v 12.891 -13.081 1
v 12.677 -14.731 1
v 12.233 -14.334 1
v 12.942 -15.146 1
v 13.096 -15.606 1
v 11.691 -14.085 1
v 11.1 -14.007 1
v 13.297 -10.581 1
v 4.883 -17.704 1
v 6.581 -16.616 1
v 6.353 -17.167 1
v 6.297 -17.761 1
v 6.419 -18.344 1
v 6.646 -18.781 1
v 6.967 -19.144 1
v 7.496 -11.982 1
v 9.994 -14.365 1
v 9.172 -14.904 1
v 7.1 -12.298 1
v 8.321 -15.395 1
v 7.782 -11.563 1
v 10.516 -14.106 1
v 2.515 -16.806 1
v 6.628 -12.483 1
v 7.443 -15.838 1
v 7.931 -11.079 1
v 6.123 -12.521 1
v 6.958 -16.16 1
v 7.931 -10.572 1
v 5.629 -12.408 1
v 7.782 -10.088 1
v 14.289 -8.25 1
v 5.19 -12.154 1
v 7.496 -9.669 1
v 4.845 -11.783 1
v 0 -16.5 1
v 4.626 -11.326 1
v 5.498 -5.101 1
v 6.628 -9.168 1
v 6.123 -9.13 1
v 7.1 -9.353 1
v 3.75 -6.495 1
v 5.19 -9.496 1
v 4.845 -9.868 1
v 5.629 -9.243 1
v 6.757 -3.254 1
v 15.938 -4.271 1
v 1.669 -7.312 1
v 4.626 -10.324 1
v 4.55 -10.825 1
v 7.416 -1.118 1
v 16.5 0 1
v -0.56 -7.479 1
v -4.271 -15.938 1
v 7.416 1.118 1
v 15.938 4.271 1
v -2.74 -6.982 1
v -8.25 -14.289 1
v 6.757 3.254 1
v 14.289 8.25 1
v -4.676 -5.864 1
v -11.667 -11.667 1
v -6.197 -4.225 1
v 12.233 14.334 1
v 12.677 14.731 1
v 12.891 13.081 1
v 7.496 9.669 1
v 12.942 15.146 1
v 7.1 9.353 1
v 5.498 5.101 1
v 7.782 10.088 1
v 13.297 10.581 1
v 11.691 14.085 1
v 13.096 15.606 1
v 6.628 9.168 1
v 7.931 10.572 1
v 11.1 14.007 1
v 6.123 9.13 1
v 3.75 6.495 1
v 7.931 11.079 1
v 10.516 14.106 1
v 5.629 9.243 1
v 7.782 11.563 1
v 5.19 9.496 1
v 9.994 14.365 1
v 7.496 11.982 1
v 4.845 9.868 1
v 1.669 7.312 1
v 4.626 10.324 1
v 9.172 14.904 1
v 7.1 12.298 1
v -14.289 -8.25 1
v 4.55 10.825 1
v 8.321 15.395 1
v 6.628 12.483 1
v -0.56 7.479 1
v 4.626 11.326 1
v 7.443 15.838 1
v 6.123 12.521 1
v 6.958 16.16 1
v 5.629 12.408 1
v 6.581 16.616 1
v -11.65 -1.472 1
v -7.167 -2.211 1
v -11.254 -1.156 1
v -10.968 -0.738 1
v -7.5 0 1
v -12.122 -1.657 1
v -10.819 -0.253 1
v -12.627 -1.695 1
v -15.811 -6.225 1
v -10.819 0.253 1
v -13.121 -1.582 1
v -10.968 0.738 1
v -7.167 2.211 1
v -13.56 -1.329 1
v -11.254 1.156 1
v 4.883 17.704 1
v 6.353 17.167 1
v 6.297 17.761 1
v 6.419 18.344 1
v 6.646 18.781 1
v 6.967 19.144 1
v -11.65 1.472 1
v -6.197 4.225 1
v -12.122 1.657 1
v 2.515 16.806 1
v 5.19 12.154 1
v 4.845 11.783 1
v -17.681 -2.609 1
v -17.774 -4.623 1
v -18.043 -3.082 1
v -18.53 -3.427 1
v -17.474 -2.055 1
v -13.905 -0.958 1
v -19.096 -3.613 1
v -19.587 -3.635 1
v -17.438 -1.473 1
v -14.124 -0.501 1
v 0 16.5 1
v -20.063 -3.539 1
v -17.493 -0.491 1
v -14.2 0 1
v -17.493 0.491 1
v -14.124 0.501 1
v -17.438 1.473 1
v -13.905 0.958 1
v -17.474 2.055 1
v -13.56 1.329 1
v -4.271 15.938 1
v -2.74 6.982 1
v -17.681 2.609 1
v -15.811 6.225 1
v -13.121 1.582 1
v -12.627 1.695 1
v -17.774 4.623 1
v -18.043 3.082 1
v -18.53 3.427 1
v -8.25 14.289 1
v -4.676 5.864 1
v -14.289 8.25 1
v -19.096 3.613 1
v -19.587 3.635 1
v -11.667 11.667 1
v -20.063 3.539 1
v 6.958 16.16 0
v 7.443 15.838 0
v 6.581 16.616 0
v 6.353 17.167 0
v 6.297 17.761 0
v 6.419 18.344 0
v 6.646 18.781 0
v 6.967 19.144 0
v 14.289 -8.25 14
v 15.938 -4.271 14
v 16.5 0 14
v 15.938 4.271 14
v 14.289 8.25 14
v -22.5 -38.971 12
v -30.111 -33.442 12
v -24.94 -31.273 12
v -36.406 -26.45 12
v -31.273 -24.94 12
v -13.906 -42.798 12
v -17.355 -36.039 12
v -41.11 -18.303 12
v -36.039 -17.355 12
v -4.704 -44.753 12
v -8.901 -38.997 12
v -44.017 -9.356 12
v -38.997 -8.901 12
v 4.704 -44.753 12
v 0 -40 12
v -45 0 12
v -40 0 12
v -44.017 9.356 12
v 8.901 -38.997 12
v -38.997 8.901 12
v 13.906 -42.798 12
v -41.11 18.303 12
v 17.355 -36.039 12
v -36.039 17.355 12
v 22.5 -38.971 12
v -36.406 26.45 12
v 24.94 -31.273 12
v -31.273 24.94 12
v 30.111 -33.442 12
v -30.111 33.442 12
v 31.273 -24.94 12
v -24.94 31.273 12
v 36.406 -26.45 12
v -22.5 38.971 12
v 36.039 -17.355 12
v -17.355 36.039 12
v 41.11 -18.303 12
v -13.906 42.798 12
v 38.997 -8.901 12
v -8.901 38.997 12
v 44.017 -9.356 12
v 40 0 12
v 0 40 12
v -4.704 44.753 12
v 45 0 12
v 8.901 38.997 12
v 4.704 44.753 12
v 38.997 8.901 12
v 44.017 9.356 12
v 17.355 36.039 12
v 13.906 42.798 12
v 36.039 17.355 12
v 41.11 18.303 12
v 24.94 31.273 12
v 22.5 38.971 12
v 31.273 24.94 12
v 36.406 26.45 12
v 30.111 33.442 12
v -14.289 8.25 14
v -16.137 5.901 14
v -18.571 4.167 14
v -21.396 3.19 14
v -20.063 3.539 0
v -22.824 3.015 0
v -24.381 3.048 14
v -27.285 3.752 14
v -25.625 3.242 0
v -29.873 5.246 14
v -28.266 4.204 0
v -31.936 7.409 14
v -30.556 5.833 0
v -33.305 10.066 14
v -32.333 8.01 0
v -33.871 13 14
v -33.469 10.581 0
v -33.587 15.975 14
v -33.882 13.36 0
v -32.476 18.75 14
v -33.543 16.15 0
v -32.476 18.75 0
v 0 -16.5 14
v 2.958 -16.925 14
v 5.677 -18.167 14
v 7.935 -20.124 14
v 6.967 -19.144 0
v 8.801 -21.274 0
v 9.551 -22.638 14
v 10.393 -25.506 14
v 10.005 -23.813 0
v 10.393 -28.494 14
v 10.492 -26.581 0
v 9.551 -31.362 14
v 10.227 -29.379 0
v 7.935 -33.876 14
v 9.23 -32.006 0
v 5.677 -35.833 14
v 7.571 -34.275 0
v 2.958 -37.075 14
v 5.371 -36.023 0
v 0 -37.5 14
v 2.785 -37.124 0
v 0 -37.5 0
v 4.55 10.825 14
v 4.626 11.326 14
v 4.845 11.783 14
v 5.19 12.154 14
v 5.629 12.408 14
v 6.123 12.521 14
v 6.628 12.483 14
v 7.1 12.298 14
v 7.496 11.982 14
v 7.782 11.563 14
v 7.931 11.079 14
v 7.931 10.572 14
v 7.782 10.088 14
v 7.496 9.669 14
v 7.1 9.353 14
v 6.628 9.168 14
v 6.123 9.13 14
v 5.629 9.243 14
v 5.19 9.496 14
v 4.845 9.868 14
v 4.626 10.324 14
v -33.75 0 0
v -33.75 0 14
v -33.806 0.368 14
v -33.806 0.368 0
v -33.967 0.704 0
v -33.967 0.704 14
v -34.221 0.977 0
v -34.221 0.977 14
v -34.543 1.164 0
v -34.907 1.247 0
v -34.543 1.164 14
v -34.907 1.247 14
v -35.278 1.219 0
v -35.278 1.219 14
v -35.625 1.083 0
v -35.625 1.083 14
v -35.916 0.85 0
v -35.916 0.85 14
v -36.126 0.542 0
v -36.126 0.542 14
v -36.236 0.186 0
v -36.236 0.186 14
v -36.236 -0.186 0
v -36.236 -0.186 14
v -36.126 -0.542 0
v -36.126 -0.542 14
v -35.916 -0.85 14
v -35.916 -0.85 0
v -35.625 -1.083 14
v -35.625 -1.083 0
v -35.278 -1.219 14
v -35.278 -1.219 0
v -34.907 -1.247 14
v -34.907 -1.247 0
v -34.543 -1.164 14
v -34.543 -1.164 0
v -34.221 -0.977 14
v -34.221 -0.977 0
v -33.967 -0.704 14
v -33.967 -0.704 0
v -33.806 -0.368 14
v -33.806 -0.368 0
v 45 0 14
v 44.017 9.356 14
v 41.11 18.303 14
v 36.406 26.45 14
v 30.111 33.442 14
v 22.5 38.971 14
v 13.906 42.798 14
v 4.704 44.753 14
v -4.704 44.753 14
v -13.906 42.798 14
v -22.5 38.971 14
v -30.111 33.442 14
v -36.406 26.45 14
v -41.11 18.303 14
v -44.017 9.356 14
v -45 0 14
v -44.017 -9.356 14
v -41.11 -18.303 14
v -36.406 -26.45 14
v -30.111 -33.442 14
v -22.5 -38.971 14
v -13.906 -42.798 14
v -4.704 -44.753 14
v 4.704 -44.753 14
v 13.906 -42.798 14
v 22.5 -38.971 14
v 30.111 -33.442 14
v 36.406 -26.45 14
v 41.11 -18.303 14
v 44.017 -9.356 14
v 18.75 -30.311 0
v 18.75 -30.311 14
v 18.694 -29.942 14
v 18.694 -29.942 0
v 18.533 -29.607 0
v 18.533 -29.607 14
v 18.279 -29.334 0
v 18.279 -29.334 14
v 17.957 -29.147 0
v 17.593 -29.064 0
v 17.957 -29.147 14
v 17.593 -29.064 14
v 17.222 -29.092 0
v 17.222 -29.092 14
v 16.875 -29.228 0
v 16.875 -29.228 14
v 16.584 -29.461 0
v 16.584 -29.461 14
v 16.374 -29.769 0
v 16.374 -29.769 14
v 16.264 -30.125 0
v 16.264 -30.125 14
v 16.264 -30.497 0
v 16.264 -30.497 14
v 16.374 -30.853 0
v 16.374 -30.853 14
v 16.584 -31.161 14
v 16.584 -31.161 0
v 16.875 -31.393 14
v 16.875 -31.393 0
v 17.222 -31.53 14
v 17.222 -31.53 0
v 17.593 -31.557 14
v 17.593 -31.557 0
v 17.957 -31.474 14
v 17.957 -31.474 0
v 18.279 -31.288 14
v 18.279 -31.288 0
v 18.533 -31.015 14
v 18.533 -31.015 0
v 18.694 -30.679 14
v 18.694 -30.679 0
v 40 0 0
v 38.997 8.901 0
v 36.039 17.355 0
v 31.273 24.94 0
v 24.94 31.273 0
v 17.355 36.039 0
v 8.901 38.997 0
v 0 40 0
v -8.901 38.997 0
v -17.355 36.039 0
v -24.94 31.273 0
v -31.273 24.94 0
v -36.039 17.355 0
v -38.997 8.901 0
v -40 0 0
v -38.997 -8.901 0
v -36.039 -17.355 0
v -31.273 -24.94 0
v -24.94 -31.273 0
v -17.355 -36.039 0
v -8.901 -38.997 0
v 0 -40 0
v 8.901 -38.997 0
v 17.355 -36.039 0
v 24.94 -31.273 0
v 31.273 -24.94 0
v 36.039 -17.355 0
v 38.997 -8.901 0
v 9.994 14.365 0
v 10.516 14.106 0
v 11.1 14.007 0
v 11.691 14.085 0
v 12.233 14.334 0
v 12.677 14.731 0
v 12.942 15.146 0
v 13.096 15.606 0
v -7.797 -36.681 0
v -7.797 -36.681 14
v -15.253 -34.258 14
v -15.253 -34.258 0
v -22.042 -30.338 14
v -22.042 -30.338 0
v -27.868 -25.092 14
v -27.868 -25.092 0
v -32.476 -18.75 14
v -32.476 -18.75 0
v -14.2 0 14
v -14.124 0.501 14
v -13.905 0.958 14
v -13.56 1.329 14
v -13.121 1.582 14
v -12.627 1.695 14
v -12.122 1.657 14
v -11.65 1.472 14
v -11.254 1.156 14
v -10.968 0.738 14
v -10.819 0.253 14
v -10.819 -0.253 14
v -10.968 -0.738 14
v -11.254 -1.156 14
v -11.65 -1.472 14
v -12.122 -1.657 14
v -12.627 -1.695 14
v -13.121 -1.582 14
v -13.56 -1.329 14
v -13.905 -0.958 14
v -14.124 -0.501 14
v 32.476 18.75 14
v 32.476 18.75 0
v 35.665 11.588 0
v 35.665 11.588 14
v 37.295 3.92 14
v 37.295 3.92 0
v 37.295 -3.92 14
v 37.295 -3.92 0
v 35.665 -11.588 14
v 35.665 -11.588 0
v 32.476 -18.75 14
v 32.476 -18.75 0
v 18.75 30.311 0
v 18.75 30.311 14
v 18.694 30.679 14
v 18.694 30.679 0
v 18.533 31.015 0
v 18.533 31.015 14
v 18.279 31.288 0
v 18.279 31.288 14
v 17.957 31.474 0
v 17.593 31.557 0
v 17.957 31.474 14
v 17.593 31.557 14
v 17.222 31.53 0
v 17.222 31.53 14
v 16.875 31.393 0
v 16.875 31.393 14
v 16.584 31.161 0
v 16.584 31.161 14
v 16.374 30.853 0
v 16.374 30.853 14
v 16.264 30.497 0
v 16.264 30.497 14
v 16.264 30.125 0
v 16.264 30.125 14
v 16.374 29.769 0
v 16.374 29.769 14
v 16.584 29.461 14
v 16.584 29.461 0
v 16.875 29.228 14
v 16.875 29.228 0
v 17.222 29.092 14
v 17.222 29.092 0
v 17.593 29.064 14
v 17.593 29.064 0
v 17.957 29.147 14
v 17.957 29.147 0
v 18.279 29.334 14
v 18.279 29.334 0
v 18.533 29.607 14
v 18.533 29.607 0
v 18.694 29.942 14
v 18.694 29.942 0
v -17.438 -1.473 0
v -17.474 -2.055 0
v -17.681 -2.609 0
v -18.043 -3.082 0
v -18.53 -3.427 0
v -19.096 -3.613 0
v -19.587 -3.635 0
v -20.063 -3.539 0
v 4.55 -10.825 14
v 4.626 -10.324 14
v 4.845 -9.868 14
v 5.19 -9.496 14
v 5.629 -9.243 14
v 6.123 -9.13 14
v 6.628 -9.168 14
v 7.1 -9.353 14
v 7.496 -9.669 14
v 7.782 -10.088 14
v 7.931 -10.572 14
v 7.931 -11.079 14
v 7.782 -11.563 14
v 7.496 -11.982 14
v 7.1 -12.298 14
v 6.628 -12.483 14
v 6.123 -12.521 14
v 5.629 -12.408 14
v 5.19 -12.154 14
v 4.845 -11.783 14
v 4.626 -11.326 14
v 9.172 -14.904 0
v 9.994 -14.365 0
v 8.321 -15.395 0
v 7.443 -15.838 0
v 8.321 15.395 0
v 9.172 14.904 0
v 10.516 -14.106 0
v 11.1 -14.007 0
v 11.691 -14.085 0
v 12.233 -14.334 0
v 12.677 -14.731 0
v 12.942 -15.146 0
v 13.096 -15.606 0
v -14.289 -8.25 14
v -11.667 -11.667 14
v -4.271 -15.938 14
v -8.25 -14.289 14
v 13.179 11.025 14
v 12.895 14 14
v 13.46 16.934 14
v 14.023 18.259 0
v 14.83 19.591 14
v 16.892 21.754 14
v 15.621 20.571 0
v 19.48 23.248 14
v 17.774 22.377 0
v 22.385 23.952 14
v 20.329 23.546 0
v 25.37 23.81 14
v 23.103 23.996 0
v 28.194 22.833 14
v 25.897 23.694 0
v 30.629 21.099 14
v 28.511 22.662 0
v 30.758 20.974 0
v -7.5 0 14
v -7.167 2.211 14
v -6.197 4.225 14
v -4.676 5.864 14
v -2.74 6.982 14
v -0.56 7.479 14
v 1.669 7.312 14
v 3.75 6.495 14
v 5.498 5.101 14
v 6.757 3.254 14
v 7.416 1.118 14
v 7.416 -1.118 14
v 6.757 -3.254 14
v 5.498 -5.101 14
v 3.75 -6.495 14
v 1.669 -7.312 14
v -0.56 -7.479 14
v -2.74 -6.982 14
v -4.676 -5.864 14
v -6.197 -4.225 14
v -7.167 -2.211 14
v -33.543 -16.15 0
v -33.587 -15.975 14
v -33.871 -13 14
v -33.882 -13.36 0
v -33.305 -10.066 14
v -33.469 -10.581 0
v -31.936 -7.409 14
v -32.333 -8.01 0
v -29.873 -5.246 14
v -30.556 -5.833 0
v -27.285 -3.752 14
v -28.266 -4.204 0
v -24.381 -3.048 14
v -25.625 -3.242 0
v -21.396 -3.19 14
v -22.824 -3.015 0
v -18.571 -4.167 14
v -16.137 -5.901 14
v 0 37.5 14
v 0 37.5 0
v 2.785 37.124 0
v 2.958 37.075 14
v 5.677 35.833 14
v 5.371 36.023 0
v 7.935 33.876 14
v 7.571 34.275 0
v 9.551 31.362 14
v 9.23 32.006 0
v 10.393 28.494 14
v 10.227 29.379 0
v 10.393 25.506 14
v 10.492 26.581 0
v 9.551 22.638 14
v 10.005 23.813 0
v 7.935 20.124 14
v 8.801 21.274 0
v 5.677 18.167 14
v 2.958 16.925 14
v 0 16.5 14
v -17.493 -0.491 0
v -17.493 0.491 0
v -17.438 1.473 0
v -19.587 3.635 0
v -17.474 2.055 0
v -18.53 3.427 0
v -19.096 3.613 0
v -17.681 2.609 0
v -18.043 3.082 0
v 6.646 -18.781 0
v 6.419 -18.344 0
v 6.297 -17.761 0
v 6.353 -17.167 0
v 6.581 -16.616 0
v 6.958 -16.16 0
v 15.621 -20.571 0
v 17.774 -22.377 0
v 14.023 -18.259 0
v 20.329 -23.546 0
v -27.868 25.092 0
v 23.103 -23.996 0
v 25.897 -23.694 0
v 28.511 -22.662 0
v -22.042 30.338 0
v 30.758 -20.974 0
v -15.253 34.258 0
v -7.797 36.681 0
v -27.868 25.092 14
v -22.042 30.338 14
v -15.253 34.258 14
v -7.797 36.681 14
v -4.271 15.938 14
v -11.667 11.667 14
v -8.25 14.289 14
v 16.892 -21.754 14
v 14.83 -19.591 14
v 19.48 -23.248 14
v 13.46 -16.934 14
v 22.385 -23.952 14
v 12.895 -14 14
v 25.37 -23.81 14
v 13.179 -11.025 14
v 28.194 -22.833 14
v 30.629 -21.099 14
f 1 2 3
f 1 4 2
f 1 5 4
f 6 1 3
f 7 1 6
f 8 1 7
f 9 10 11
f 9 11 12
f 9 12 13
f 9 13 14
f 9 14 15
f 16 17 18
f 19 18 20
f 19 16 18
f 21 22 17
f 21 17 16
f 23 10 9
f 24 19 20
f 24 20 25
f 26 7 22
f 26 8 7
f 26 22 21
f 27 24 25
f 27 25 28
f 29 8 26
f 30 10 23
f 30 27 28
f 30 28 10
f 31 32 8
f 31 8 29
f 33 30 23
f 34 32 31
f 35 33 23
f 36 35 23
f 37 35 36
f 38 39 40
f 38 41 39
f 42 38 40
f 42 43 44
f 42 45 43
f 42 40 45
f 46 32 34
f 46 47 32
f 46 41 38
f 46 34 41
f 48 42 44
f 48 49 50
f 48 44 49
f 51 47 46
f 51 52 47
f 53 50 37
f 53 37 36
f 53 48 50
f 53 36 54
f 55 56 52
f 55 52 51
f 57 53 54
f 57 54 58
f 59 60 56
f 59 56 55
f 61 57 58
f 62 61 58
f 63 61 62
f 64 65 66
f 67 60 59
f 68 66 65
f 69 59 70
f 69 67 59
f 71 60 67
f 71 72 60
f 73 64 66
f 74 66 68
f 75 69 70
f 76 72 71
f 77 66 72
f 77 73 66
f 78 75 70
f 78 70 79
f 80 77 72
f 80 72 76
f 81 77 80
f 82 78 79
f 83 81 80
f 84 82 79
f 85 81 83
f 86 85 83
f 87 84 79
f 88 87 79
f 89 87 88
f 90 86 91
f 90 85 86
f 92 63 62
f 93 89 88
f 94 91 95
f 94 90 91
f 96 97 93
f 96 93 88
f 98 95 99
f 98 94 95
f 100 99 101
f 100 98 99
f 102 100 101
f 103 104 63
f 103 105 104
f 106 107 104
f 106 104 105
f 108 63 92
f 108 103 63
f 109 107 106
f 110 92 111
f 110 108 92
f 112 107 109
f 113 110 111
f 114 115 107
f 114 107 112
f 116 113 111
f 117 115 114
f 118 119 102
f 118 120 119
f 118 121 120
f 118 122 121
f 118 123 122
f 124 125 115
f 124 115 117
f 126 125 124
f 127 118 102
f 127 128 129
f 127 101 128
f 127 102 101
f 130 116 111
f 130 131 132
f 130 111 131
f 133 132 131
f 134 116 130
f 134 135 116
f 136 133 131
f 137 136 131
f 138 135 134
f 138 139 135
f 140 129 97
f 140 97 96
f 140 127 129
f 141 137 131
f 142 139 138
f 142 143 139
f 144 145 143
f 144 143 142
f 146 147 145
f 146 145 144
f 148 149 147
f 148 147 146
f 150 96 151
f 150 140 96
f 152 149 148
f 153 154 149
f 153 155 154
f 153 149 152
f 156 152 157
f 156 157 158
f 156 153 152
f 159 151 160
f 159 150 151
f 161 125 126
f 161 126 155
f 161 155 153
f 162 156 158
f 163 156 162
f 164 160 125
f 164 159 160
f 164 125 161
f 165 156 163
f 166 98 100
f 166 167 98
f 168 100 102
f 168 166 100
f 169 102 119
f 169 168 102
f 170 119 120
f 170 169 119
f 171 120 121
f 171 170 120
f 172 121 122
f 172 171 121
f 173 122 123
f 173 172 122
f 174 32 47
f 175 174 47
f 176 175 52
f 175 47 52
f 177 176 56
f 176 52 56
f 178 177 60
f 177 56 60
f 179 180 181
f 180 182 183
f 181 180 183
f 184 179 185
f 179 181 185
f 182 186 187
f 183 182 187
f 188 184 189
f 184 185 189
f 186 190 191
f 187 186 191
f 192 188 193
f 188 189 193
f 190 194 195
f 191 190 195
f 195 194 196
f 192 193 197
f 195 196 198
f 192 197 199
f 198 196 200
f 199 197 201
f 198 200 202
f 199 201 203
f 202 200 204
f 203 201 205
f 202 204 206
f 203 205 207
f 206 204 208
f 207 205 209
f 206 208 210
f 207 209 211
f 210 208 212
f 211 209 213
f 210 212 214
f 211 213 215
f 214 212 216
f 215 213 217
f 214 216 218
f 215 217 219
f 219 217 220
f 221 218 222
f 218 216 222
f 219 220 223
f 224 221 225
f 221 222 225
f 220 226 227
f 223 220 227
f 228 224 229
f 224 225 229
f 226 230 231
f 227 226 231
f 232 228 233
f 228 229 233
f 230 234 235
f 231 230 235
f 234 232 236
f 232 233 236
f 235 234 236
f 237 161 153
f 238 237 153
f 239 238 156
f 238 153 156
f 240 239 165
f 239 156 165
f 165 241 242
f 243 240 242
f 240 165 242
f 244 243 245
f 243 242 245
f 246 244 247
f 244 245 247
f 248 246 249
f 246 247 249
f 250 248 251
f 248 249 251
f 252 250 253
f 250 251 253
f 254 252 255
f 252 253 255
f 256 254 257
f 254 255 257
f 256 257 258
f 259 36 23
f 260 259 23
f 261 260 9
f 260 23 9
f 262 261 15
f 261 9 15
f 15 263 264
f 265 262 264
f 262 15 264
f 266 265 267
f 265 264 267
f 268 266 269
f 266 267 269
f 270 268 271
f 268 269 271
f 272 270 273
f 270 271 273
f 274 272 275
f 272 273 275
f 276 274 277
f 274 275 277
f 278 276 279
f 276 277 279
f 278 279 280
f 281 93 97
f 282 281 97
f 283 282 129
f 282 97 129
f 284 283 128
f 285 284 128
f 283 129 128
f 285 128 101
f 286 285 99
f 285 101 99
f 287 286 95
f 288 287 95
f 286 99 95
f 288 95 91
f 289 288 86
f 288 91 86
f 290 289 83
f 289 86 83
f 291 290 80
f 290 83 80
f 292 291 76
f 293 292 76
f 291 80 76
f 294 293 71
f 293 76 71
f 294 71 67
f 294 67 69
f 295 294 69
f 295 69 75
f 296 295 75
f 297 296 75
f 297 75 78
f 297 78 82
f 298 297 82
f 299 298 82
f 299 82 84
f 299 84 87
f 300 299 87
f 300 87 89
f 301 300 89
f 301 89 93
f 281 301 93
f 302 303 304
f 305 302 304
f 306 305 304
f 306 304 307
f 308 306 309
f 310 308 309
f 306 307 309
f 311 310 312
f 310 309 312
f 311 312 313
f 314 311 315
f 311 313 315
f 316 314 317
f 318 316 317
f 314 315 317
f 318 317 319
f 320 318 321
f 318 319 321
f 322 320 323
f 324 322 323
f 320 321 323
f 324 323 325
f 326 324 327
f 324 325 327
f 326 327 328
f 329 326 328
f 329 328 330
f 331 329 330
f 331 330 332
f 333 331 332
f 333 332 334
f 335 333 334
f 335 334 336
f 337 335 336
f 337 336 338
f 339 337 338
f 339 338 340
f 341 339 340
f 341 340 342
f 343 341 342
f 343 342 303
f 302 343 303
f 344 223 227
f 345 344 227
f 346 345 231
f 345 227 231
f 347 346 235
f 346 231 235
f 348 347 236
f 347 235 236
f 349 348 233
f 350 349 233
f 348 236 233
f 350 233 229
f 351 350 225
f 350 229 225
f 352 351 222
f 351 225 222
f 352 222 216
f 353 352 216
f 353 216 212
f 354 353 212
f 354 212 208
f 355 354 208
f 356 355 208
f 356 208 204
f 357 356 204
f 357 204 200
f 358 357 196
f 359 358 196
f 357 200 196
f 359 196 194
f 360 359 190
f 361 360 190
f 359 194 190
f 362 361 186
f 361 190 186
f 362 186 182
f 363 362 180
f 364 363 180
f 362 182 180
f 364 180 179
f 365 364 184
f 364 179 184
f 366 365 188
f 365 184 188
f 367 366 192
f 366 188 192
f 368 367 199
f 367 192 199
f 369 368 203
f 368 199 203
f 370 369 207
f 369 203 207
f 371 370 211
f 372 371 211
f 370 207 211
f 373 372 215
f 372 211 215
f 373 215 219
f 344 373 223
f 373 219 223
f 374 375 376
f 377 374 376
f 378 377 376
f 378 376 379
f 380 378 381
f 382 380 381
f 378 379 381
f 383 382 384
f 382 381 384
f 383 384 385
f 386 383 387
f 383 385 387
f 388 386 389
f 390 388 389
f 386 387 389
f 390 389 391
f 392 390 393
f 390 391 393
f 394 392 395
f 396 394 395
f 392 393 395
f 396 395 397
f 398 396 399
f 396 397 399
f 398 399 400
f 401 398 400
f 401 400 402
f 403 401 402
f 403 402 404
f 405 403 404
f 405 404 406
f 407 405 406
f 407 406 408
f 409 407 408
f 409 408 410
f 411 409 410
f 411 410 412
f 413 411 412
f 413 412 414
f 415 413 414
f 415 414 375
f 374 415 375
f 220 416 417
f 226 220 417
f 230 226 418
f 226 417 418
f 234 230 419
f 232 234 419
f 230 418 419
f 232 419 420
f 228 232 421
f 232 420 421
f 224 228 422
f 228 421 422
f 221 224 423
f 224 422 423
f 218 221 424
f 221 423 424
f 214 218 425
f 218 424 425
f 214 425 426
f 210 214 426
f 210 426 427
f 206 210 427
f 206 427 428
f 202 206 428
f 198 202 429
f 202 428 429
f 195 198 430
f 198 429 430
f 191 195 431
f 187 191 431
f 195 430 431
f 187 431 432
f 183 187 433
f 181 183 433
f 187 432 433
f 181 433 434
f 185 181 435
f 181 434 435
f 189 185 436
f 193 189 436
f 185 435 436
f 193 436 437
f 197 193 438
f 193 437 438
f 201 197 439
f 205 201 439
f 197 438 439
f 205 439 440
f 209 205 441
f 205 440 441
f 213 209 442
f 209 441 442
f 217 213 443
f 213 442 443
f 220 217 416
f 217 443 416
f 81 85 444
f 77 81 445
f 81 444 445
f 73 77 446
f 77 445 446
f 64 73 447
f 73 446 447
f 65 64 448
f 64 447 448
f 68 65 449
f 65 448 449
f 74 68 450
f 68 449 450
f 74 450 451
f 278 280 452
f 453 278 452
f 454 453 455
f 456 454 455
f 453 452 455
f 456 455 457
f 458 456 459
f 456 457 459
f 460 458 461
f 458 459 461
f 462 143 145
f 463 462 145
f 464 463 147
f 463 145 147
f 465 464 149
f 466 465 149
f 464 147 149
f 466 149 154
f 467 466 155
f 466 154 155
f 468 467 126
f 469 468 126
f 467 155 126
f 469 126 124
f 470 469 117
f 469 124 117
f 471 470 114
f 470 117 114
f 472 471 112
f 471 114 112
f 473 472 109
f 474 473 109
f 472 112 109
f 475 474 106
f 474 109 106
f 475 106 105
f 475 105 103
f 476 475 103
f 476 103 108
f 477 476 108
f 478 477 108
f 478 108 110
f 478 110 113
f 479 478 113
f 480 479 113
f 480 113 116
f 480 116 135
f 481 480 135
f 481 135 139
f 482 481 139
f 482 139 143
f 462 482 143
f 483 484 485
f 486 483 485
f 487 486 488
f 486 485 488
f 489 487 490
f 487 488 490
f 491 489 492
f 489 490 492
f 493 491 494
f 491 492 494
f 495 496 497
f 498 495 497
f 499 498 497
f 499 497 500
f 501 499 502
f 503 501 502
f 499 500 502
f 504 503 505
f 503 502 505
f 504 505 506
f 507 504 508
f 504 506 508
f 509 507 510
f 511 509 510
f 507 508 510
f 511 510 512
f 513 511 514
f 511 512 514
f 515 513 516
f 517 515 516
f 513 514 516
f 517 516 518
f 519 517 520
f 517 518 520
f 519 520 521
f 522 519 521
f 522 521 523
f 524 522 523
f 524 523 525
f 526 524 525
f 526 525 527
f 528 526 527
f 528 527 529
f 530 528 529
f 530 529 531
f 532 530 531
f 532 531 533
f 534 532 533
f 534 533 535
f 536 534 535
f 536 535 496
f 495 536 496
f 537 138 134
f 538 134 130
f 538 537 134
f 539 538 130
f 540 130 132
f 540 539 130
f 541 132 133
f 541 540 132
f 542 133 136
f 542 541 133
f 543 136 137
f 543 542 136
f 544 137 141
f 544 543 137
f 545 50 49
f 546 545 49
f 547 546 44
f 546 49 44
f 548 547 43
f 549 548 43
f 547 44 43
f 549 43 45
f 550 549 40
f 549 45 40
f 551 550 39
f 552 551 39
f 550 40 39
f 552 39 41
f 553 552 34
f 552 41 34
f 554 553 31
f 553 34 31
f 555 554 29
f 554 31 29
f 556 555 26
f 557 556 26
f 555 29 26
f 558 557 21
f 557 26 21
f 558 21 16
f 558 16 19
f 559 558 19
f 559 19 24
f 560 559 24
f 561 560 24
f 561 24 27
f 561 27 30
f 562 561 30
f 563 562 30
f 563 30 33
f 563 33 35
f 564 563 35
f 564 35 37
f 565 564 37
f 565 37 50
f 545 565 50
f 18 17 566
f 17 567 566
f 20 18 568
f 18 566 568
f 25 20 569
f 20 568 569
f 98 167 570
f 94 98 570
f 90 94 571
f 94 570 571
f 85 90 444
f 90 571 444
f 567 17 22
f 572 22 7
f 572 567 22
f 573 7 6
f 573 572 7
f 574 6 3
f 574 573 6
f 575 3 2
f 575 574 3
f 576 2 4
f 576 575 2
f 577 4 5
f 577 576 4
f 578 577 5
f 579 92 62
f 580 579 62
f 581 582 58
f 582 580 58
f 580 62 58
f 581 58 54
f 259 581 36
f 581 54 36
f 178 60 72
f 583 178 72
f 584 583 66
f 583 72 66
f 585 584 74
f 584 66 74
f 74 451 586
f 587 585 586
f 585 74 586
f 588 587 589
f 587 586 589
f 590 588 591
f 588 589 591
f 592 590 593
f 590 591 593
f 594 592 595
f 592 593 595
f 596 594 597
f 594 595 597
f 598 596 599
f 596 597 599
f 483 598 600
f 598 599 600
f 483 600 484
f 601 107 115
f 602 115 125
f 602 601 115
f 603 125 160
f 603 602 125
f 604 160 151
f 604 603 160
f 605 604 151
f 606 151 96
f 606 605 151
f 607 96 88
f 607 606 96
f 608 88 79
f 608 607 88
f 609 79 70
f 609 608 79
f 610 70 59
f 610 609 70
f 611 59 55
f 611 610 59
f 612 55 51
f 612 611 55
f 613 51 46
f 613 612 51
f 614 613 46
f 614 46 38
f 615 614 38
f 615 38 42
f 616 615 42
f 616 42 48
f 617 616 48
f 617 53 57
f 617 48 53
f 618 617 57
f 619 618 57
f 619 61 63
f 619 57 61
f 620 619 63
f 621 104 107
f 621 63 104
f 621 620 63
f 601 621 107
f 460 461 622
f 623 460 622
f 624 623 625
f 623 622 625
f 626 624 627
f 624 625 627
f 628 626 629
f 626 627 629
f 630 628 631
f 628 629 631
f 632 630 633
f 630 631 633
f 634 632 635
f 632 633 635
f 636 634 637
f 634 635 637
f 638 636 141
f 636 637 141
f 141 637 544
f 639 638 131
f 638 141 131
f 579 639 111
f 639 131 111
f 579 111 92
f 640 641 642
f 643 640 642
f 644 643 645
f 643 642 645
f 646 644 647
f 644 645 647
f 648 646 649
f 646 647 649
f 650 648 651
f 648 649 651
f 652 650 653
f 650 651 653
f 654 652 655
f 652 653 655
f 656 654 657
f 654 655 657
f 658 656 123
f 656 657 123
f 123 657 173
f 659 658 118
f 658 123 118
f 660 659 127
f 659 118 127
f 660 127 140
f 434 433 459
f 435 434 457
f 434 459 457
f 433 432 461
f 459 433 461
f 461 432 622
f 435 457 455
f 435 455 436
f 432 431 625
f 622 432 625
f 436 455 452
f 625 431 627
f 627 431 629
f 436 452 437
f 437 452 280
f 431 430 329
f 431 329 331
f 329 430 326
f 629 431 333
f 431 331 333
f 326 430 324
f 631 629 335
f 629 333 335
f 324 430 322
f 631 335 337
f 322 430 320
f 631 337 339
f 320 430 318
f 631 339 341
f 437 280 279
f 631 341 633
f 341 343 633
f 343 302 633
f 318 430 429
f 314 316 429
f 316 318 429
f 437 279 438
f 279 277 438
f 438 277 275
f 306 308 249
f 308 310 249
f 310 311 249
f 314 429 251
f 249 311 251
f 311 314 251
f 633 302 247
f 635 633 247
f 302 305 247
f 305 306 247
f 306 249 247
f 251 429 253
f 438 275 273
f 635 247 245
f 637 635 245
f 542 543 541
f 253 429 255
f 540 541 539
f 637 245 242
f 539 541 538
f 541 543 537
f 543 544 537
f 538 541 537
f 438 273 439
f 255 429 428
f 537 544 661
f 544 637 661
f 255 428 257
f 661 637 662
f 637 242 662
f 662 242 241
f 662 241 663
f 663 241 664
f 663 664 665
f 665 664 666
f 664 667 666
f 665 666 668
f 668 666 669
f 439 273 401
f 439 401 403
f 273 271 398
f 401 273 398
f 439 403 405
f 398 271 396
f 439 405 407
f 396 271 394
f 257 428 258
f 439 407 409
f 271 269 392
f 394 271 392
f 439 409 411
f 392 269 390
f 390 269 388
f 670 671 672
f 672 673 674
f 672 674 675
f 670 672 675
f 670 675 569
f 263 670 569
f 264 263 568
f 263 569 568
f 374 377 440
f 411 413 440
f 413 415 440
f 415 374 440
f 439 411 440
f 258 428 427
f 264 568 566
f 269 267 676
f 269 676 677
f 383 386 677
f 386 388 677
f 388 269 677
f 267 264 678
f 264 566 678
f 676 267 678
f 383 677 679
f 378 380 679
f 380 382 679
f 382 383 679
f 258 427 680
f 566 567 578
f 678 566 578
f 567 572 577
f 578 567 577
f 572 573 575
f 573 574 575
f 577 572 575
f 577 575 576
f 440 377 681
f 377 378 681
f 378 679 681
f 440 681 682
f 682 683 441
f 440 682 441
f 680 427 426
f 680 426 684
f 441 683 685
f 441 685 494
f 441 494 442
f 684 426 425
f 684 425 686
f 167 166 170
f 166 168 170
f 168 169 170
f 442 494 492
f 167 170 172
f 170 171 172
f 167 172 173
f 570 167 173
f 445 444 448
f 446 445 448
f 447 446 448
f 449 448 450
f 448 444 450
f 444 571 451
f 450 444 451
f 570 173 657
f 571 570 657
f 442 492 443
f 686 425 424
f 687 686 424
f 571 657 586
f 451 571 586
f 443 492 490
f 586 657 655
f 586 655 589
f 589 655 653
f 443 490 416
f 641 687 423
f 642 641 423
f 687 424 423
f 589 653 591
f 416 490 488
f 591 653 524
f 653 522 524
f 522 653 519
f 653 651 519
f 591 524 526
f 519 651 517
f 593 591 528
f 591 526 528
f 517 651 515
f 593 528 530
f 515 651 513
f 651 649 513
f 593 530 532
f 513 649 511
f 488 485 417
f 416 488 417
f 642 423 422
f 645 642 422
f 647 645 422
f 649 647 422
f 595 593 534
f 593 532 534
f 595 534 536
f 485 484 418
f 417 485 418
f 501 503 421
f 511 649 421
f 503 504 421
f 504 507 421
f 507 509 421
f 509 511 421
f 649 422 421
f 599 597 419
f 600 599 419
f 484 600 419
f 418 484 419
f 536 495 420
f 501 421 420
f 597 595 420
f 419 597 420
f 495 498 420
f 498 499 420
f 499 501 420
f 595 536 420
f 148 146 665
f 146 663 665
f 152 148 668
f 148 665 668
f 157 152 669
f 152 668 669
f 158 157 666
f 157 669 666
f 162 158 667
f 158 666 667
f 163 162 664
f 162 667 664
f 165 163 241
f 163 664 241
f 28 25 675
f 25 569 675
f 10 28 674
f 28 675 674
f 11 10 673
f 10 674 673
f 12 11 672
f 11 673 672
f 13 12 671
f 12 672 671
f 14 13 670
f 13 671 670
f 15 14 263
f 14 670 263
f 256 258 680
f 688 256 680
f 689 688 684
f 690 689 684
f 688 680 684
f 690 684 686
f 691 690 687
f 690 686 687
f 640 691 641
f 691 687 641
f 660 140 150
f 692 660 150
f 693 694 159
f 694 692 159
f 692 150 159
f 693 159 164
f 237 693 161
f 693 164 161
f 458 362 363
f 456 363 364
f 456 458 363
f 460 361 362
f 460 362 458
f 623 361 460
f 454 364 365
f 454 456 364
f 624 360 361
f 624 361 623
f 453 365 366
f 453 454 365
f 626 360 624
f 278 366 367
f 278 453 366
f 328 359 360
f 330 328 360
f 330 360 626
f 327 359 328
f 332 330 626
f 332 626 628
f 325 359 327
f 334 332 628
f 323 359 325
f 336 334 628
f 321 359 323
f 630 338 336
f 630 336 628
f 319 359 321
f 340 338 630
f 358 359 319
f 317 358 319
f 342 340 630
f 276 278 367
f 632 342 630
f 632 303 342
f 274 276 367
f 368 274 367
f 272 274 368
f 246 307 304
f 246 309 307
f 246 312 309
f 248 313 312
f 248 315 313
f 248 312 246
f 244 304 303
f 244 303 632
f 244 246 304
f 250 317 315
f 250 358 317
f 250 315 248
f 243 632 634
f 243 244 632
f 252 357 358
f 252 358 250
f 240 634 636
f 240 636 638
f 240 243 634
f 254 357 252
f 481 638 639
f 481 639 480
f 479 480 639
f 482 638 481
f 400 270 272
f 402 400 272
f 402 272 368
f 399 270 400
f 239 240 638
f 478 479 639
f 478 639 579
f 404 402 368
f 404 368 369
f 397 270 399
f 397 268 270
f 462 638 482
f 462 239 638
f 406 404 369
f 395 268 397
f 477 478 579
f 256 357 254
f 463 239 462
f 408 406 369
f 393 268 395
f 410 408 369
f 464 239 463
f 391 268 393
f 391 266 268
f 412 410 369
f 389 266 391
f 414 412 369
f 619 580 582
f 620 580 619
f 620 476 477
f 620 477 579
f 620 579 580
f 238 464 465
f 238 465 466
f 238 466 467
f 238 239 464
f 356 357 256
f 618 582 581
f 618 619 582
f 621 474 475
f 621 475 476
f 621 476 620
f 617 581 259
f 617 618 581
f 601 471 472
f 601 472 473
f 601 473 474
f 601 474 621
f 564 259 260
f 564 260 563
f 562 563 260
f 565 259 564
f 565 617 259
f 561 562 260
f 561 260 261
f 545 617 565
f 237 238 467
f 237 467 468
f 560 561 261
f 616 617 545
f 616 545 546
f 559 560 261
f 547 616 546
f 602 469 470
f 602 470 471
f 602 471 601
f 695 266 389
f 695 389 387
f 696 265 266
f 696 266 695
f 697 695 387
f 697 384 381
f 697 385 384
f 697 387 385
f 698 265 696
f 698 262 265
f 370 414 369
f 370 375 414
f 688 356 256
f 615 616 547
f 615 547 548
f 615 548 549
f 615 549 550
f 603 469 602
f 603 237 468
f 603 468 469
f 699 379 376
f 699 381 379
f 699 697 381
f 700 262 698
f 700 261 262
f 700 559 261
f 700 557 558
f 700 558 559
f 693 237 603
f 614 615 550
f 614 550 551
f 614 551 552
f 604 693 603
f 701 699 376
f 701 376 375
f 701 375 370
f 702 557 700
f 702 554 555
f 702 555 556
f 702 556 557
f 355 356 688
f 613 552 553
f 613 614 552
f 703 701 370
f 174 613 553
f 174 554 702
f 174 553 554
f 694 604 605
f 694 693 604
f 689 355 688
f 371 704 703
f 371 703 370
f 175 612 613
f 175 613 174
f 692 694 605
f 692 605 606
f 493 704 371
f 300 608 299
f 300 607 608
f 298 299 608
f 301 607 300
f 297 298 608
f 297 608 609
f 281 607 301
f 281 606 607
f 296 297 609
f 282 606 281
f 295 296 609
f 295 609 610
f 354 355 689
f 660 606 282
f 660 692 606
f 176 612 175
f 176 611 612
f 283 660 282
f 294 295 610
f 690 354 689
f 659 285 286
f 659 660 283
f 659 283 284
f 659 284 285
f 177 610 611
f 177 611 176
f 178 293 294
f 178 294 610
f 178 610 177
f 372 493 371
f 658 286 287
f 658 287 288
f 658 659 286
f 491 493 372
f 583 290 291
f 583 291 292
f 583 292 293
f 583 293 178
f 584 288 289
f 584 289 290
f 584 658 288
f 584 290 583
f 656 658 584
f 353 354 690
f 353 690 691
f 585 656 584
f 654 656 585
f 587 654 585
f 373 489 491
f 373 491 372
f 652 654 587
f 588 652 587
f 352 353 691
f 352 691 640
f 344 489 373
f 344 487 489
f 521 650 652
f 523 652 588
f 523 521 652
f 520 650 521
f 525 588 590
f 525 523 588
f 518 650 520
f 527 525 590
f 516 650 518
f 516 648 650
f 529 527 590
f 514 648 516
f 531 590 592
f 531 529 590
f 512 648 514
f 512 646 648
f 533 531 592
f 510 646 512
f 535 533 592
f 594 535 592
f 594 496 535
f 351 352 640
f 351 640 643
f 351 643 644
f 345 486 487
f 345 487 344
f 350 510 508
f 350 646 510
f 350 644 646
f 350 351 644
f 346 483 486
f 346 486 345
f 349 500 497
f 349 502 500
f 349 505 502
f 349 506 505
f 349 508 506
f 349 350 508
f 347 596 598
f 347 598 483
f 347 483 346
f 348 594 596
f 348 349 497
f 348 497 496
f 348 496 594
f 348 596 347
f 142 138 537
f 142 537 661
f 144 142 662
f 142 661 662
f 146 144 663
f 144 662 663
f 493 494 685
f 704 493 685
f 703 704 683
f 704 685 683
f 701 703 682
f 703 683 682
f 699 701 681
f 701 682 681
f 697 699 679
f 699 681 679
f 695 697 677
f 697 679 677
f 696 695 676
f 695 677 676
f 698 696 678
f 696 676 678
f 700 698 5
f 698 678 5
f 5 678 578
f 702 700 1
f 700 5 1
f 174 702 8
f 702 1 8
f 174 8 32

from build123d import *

# Parameters (mm, degrees)
SKETCH_1_R          = 40
EXTRUDE_1_DEPTH     = 12
SKETCH_8_R          = 45
EXTRUDE_3_DEPTH     = 2
SKETCH_2_R          = 7.5
CUT_EXTRUDE_1_DEPTH = 66.161338231
HOLE_WIZARD_M32_D   = 3.4
CUT_EXTRUDE_2_DEPTH = 66.161338231
M3X0_51_D           = 2.5
SKETCH_18_R         = 17.5
CUT_EXTRUDE_4_DEPTH = 1
FILLET_1_R          = 2


with BuildPart() as part:
    # Эскиз1 → Бобышка-Вытянуть1 (new body)
    with BuildSketch(Plane.XY):
        Circle(SKETCH_1_R)
    extrude(amount=EXTRUDE_1_DEPTH)

    # Эскиз8 → Бобышка-Вытянуть3 (add)
    with BuildSketch(Plane.XY.offset(12)):
        Circle(SKETCH_8_R)
    extrude(amount=EXTRUDE_3_DEPTH)

    # Эскиз2 → Вырез-Вытянуть1 (cut, through all)
    with BuildSketch(Plane(origin=(0, 0, 14), x_dir=(-1, 0, 0), z_dir=(0, 0, -1))):
        Circle(SKETCH_2_R)
    extrude(amount=CUT_EXTRUDE_1_DEPTH, mode=Mode.SUBTRACT)

    # Отверстие с зазором M32 (through all)
    with Locations(Plane.XY.offset(14)):
        with Locations((6.25, 10.825317547), (-12.5, 0), (6.25, -10.825317547)):
            Hole(HOLE_WIZARD_M32_D / 2)

    # Эскиз10 → Вырез-Вытянуть2 (cut, through all)
    with BuildSketch(Plane(origin=(0, 0, 0), x_dir=(-1, 0, 0), z_dir=(0, 0, -1))):
        with BuildLine():
            ThreePointArc((32.475952642, -18.75), (28.632685902, -4.40673326), (14.289419162, -8.25))
            ThreePointArc((14.289419162, -8.25), (8.25, -14.289419162), (0, -16.5))
            ThreePointArc((0, -16.5), (-10.5, -27), (0, -37.5))
            ThreePointArc((0, -37.5), (18.75, -32.475952642), (32.475952642, -18.75))
        make_face()
        with BuildLine():
            ThreePointArc((32.475952642, 18.75), (18.75, 32.475952642), (0, 37.5))
            ThreePointArc((0, 37.5), (-10.5, 27), (0, 16.5))
            ThreePointArc((0, 16.5), (8.25, 14.289419162), (14.289419162, 8.25))
            ThreePointArc((14.289419162, 8.25), (28.632685902, 4.40673326), (32.475952642, 18.75))
        make_face()
        with BuildLine():
            ThreePointArc((-32.475952642, -18.75), (-18.132685902, -22.59326674), (-14.289419162, -8.25))
            ThreePointArc((-14.289419162, -8.25), (-16.5, 0), (-14.289419162, 8.25))
            ThreePointArc((-14.289419162, 8.25), (-18.132685902, 22.59326674), (-32.475952642, 18.75))
            ThreePointArc((-32.475952642, 18.75), (-37.5, 0), (-32.475952642, -18.75))
        make_face()
    extrude(amount=-CUT_EXTRUDE_2_DEPTH, mode=Mode.SUBTRACT)

    # Отверстие обработанное метчиком M3x0.51 (through all)
    with Locations(Plane(origin=(0, 0, 0), x_dir=(-1, 0, 0), z_dir=(0, 0, -1))):
        with Locations((-17.5, 30.310889132), (35, 0), (-17.5, -30.310889132)):
            Hole(M3X0_51_D / 2)

    # Эскиз18 → Вырез-Вытянуть4 (cut)
    with BuildSketch(Plane(origin=(0, 0, 0), x_dir=(-1, 0, 0), z_dir=(0, 0, -1))):
        Circle(SKETCH_18_R)
    extrude(amount=-CUT_EXTRUDE_4_DEPTH, mode=Mode.SUBTRACT)

    # Скругление1
    fillet_1_edges = [part.edges().sort_by_distance(p)[0] for p in [
        (3.581311038, 17.12962963, 0.5),
        (-16.625349936, 5.463308477, 0.5),
        (-16.625349936, -5.463308477, 0.5),
        (3.581311038, -17.12962963, 0.5),
        (13.044038898, -11.666321153, 0.5),
        (13.044038898, 11.666321153, 0.5),
    ]]
    fillet(fillet_1_edges, radius=FILLET_1_R)


solid = part.part
